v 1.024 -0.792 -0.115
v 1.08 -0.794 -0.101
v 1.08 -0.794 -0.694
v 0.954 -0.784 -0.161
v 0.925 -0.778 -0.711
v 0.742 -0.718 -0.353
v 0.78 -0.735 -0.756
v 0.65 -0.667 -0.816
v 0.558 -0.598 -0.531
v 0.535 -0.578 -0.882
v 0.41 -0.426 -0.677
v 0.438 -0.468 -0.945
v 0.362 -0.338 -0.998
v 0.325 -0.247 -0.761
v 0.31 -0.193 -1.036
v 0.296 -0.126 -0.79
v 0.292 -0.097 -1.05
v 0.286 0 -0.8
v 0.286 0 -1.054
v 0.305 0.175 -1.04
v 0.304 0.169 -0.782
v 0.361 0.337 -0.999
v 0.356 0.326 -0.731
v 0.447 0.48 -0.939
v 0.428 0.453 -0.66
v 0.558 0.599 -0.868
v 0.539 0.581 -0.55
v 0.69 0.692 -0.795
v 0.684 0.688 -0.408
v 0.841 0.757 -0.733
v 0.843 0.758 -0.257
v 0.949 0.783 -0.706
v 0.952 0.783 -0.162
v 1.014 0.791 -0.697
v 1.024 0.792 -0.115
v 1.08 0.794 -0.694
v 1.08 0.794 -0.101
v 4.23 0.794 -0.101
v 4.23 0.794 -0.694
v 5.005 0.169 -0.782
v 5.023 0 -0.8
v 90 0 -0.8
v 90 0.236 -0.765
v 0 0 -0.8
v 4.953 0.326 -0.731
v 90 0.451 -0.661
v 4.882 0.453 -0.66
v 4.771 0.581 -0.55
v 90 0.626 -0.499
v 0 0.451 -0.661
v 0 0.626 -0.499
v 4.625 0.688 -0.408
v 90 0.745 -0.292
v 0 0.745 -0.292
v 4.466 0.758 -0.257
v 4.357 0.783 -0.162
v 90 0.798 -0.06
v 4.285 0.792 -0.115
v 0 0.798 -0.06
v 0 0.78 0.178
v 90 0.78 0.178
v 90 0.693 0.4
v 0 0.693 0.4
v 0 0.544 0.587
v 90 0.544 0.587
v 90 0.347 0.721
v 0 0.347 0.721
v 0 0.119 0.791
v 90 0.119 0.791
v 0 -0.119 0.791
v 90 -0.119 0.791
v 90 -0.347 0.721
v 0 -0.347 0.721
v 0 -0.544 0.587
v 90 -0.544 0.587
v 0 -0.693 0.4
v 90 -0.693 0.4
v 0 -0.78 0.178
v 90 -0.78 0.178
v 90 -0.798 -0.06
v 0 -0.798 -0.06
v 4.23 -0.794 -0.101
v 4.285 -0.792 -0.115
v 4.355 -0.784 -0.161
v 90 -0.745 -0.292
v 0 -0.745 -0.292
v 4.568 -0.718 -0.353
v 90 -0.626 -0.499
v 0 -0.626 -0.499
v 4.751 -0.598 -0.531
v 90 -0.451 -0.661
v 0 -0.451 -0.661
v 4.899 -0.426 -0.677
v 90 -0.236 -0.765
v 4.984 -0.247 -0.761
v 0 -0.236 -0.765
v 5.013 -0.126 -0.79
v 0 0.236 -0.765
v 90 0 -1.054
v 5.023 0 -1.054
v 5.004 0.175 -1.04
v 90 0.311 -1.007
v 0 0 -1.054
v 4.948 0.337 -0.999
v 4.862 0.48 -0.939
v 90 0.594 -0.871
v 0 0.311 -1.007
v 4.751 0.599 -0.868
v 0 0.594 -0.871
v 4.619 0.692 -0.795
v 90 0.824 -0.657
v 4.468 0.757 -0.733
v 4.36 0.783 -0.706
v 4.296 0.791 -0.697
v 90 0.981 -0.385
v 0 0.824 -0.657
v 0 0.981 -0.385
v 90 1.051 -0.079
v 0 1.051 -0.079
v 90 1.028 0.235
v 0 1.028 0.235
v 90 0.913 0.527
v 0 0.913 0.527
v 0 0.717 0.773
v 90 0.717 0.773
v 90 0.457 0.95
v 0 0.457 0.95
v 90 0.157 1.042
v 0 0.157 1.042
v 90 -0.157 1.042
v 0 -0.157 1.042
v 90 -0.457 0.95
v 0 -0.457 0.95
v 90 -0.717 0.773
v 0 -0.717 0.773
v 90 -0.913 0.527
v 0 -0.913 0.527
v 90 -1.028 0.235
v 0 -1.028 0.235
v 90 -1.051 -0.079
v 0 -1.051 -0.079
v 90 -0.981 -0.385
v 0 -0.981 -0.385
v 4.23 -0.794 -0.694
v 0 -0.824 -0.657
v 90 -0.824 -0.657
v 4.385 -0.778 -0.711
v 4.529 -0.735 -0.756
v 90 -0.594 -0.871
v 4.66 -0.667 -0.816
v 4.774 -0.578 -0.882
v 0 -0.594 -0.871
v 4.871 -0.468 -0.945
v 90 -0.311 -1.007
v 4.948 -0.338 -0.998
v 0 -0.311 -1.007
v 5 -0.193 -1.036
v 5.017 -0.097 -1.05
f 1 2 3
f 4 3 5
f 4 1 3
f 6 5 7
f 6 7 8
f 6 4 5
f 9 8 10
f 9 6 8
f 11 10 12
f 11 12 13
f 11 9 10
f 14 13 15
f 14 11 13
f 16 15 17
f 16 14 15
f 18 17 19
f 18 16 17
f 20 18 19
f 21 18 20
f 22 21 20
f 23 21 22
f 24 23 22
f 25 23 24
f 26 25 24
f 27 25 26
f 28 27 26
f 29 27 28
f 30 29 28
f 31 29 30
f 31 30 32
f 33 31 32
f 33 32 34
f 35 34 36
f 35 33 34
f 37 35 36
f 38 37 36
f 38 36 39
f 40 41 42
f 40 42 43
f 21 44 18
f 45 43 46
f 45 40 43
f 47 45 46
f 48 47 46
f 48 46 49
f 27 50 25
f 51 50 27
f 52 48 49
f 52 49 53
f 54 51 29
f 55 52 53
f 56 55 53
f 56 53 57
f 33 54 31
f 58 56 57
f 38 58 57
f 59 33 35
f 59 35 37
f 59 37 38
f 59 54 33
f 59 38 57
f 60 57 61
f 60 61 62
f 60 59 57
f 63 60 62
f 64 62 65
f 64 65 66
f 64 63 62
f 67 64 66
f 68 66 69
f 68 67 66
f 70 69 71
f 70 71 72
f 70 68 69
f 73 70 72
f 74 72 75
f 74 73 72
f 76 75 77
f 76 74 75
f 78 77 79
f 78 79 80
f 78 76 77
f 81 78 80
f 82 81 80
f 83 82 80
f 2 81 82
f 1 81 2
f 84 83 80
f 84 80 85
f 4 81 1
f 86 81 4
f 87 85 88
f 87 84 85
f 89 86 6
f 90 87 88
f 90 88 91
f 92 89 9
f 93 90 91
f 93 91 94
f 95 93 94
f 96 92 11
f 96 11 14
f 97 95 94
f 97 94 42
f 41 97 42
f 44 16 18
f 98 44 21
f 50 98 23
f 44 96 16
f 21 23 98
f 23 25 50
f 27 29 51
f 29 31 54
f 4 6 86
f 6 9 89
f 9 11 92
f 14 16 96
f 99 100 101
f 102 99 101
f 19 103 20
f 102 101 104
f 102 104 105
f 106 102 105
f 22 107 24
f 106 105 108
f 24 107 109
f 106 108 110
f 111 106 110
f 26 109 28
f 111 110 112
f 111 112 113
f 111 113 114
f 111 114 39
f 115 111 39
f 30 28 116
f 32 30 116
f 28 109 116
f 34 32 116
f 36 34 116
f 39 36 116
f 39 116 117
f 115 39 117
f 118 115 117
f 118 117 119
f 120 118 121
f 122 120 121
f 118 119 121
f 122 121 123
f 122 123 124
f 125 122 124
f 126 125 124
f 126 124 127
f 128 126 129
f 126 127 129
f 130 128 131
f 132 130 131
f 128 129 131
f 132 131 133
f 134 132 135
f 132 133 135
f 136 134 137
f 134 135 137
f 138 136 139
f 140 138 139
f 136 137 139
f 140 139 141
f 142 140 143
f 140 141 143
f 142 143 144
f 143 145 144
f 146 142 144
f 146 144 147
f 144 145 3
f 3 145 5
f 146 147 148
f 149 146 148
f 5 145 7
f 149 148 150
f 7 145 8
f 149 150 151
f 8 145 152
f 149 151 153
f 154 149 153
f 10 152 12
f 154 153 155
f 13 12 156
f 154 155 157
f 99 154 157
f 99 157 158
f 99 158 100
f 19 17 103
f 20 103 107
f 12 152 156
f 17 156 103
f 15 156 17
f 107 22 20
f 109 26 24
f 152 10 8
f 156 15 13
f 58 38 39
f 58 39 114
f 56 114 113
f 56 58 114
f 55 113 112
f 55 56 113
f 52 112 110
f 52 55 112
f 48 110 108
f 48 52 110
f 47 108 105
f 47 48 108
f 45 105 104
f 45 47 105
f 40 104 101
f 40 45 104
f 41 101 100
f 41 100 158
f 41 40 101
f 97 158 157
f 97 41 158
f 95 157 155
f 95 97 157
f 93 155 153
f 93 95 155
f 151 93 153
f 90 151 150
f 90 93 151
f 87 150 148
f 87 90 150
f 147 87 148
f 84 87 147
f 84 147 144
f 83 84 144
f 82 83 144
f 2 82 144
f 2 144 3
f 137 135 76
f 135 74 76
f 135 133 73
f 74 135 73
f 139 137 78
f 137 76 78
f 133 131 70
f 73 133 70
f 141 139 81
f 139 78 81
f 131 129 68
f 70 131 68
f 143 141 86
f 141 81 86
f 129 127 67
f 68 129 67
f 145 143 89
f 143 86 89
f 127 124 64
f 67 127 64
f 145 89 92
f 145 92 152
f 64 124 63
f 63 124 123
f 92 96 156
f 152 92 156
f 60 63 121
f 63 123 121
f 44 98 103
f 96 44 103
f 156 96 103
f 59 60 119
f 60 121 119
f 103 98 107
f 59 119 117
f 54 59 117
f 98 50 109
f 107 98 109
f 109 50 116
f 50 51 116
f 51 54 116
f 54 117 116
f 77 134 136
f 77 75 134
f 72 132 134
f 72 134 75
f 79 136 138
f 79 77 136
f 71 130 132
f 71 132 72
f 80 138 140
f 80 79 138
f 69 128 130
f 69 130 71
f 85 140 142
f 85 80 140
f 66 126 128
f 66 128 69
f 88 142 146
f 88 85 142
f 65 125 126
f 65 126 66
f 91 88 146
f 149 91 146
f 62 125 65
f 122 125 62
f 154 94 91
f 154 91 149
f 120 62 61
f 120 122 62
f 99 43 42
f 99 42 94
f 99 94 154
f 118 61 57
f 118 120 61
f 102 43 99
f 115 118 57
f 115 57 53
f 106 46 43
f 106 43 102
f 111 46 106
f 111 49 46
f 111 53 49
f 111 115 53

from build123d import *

# Parameters (mm, degrees)
SKETCH1_R           = 1.0541
SKETCH1_R_2         = 0.8001
BOSS_EXTRUDE1_DEPTH = 90
CUT_EXTRUDE2_DEPTH  = 10


with BuildPart() as part:
    # Sketch1 → Boss-Extrude1 (new body)
    with BuildSketch(Plane(origin=(0, 0, 0), x_dir=(0, 0, -1), z_dir=(1, 0, 0))):
        Circle(SKETCH1_R)
        Circle(SKETCH1_R_2, mode=Mode.SUBTRACT)
    extrude(amount=BOSS_EXTRUDE1_DEPTH)

    # Sketch3 → Cut-Extrude2 (cut)
    with BuildSketch(Plane.XY):
        with BuildLine():
            Line((1.079657865, 0.79375), (4.229657865, 0.79375))
            ThreePointArc((4.229657865, 0.79375), (5.023407865, 0), (4.229657865, -0.79375))
            Line((4.229657865, -0.79375), (1.079657865, -0.79375))
            ThreePointArc((1.079657865, -0.79375), (0.285907865, 0), (1.079657865, 0.79375))
        make_face()
    extrude(amount=-CUT_EXTRUDE2_DEPTH, mode=Mode.SUBTRACT)


solid = part.part
